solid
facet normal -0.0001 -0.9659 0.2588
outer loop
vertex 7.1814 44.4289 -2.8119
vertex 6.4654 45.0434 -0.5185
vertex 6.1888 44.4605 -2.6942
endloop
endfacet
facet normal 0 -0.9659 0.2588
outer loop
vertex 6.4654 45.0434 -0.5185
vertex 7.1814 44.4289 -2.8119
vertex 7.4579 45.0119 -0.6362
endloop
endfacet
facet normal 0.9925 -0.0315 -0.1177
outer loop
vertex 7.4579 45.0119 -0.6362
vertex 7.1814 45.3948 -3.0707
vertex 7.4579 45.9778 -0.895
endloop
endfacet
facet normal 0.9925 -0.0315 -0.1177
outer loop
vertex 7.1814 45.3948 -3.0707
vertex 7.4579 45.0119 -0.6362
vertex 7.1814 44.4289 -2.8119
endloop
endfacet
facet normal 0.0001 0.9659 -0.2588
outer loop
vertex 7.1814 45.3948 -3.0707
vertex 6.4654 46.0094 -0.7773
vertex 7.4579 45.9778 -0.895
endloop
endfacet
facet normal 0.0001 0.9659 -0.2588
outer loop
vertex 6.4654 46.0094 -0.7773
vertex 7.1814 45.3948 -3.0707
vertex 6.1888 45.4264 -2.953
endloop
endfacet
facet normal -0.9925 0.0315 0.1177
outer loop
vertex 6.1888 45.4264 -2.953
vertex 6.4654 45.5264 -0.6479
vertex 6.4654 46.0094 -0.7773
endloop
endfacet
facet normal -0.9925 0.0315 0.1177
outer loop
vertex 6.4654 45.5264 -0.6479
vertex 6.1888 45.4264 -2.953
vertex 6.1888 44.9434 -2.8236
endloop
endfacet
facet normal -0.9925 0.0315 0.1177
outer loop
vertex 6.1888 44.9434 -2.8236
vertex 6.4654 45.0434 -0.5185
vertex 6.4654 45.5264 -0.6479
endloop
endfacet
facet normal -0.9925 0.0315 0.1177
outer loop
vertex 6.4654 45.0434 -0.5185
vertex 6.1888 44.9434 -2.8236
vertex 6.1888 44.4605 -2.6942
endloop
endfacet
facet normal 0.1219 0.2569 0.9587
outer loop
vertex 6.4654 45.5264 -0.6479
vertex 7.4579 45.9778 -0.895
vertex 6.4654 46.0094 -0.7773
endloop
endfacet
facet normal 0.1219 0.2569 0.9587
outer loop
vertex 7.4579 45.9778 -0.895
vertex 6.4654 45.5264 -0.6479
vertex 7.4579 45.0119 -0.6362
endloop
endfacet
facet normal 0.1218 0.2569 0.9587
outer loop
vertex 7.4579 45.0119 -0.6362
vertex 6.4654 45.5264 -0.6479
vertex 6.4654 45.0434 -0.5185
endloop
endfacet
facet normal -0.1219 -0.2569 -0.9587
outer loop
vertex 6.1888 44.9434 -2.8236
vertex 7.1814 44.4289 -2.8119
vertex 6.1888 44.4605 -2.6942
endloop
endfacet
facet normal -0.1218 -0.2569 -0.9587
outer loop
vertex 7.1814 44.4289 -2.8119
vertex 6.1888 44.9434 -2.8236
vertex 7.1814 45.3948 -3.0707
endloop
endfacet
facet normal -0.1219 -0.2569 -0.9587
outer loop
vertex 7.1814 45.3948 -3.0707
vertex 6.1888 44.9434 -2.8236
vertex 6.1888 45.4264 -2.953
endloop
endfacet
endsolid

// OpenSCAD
polyhedron(points = [
        [6.46538, 45.0434, -0.5185],
        [7.45793, 45.0119, -0.636215],
        [7.45793, 45.9778, -0.895034],
        [6.46538, 46.0094, -0.77732],
        [6.46538, 45.5264, -0.64791],
        [6.18882, 44.4605, -2.69418],
        [7.18137, 44.4289, -2.8119],
        [7.18137, 45.3948, -3.07072],
        [6.18882, 45.4264, -2.953],
        [6.18882, 44.9434, -2.82359]],

    faces =



    [[0, 1, 6, 5],
        [1, 2, 7, 6],
        [2, 3, 8, 7],
        [3, 4, 9, 8],
        [4, 0, 5, 9],
        [4, 3, 2, 1, 0],
        [5, 6, 7, 8, 9]]);
